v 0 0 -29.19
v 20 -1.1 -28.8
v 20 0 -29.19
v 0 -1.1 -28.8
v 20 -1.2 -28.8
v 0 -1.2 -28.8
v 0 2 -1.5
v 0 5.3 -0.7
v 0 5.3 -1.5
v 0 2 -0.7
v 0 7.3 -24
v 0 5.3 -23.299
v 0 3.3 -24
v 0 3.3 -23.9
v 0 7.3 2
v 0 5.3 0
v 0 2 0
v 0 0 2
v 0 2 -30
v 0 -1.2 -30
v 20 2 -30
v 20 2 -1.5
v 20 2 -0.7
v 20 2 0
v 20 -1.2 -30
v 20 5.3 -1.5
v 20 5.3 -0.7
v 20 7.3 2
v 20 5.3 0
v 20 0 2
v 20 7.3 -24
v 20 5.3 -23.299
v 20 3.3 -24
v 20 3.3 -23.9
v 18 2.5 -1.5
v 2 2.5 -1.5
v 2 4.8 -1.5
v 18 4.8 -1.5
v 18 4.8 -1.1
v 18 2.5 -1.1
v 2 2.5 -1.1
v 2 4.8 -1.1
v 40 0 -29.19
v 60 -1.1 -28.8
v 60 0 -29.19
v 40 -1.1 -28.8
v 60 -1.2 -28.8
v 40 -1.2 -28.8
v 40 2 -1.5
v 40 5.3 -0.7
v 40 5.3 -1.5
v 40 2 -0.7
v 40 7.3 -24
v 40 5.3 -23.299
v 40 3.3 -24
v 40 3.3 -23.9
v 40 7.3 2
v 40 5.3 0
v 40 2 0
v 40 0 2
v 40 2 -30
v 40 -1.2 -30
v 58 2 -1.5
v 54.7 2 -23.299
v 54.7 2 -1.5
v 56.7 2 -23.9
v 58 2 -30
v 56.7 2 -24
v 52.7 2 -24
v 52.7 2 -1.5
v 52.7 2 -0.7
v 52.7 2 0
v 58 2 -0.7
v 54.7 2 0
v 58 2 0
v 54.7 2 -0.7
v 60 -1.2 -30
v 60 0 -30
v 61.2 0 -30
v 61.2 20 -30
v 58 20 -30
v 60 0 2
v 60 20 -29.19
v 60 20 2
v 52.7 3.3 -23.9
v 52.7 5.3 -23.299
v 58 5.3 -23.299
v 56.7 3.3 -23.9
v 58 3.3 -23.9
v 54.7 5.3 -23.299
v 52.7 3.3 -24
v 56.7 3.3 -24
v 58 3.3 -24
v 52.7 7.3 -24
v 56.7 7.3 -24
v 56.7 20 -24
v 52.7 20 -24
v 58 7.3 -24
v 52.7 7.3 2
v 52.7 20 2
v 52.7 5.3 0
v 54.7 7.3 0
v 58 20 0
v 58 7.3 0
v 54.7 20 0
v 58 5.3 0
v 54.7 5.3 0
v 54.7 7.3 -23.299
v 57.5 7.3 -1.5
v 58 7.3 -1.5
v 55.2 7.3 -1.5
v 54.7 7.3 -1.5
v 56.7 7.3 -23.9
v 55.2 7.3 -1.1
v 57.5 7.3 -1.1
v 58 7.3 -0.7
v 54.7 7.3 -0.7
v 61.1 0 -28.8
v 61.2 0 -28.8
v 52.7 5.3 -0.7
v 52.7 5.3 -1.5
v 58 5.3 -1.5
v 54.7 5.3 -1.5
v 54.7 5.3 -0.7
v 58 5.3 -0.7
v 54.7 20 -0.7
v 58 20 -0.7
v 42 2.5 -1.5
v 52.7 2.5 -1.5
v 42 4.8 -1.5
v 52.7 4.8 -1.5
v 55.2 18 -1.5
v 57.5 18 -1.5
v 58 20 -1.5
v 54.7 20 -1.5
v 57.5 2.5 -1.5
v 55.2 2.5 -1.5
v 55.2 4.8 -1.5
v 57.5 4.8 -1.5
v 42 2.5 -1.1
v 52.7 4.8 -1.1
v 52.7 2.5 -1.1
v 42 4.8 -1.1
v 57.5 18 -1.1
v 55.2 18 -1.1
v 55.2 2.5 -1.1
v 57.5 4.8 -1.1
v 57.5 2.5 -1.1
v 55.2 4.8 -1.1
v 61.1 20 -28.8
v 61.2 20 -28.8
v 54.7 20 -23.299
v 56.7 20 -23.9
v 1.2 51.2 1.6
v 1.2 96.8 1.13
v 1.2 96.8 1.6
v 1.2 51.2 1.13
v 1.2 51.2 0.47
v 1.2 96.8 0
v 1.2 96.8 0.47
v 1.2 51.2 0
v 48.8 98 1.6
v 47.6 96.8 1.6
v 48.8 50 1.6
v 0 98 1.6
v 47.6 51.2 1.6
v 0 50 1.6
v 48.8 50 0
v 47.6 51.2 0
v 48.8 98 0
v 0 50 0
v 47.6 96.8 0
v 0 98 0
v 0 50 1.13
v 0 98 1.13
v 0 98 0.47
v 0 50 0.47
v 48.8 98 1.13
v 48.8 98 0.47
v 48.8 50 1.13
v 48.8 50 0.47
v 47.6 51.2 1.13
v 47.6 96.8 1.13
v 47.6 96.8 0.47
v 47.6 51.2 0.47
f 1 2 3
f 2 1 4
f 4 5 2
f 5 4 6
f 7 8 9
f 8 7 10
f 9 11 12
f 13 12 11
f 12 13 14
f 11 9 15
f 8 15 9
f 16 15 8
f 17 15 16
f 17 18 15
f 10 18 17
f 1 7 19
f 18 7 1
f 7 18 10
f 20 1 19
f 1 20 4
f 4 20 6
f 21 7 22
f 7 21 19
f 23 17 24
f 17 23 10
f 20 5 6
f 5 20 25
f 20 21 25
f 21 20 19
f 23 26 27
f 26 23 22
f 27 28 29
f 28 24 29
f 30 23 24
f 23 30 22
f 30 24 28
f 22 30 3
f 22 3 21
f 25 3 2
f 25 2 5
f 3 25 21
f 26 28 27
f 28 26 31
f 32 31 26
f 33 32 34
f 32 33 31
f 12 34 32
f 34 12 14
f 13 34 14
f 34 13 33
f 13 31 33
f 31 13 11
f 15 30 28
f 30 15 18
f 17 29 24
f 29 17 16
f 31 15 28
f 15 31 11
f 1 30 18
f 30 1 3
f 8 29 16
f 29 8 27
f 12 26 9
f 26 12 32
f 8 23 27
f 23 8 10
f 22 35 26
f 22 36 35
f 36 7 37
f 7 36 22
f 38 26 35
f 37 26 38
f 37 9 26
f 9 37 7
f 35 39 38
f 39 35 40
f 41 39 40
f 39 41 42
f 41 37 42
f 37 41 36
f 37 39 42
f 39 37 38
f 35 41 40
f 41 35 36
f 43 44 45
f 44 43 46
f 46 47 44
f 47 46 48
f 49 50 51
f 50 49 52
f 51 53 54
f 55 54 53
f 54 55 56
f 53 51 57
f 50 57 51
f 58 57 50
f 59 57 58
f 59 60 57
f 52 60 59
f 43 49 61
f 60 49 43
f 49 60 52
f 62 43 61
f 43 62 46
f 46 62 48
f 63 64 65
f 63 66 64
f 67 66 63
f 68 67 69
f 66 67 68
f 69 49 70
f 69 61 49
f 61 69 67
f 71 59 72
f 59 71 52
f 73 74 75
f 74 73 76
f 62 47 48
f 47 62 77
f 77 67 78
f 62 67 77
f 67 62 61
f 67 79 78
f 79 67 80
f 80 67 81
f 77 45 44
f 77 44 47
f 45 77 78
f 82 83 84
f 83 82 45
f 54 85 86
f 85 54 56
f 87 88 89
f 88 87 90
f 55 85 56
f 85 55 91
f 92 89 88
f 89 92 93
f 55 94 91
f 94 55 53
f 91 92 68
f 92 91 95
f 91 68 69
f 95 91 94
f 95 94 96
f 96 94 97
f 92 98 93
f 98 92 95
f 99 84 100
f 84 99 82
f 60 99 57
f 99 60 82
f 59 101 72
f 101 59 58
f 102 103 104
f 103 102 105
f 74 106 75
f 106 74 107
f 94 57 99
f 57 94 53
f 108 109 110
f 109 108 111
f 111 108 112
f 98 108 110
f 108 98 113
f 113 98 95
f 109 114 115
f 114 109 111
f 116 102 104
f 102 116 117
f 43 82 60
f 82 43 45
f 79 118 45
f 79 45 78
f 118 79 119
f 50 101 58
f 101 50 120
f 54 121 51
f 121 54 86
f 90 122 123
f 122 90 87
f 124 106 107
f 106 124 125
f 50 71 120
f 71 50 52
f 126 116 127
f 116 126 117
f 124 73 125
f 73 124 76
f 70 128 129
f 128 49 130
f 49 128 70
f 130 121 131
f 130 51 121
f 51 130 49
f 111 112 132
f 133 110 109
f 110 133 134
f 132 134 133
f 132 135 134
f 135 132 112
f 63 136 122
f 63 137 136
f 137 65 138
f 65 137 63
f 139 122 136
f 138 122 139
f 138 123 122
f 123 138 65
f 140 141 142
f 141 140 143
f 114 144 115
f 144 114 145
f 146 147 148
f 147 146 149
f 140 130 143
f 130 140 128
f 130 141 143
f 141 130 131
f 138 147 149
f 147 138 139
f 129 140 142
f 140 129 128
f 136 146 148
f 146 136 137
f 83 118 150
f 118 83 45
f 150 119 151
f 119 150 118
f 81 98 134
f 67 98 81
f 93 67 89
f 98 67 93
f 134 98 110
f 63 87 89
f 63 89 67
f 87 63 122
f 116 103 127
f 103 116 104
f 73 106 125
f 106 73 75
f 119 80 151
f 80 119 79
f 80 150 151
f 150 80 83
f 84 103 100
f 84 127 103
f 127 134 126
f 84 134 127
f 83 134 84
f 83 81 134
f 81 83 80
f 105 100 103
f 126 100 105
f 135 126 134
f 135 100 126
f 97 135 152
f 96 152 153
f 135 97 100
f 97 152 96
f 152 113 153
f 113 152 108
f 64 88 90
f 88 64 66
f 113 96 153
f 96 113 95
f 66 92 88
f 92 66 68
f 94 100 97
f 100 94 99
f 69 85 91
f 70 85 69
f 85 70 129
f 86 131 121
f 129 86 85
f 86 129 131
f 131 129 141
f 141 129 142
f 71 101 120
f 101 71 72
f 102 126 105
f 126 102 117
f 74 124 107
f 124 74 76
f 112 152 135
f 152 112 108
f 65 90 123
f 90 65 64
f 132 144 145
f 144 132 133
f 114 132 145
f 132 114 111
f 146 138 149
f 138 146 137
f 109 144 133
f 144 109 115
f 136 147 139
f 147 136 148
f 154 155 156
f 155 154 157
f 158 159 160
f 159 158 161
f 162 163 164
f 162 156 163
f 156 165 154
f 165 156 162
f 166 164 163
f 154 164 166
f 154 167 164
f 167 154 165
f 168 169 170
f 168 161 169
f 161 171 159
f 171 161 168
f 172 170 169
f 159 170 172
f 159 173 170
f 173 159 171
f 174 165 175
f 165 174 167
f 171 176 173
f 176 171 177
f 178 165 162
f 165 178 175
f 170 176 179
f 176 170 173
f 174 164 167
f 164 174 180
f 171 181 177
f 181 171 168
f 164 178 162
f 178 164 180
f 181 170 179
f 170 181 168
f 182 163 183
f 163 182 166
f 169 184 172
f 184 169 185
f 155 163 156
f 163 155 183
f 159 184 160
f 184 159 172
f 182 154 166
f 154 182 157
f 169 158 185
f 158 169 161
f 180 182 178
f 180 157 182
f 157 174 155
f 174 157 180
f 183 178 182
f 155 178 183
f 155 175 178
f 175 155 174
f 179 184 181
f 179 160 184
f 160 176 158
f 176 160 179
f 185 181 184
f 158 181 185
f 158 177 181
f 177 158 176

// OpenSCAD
// ==========================================
// SNAP-FIT CLIP PARA TAMPA E BASE - CAIXA DE FILTRAGEM
// Impressão 3D - PLA/PETG (Ender 3)
// ==========================================
// 16 clips: 8 tampa (topo) + 8 base (inferior)
// Encaixam na tampa/base (3mm) e travam na borda lateral/frontal/traseira
// Vedação com lábio flexível
// Pé dobrado: altura 30mm (ext) / 24mm (int)
// Requer slots 22×2mm cortados no MDF a 30mm da borda
// ==========================================

// Parâmetros da caixa
mdf = 3;          // Espessura MDF
folga = 0.3;      // Folga para encaixe
parede = 2;       // Espessura da parede do clip

// Parâmetros do clip
largura_clip = 20;   // Largura do clip ao longo da borda
altura_ext = 30;     // Altura externa (pé dobrado, desce pelo lado externo)
altura_int = 24;     // Altura interna (pé dobrado, desce por dentro da caixa)
gancho = 1.2;        // Profundidade do gancho snap-fit
angulo_gancho = 45;  // Ângulo da rampa de entrada

// Slot no MDF para o gancho
slot_largura = 22;   // 20mm clip + 2mm folga
slot_altura = 2;     // 1.2mm gancho + folga
slot_pos_borda = 30; // Distância do gancho até a borda (= altura_ext)

// Lábio de vedação
labio_h = 1.5;    // Altura do lábio
labio_esp = 0.8;  // Espessura do lábio (flexível)

module snap_clip_tampa() {
    // Parte que abraça a borda (U invertido)
    difference() {
        union() {
            // Parte superior (sobre a tampa)
            translate([0, 0, 0])
                cube([largura_clip, mdf + folga + 2*parede, parede]);
            
            // Parede externa (desce por fora da caixa)
            translate([0, 0, -altura_ext])
                cube([largura_clip, parede, altura_ext + parede]);
            
            // Parede interna (desce por dentro da caixa)
            translate([0, mdf + folga + parede, -altura_int])
                cube([largura_clip, parede, altura_int + parede]);
            
            // Gancho externo (snap-fit)
            translate([0, 0, -altura_ext])
                gancho_snap(largura_clip, parede, gancho, angulo_gancho);
            
            // Gancho interno (snap-fit)
            translate([0, mdf + folga + parede, -altura_int])
                mirror([0, 1, 0])
                    gancho_snap(largura_clip, parede, gancho * 0.8, angulo_gancho);
            
            // Lábio de vedação (interno, flexível)
            translate([0, parede, -labio_h])
                cube([largura_clip, mdf + folga, labio_esp]);
        }
        
        // Canal para facilitar flexão do lábio
        translate([largura_clip/2, parede + (mdf+folga)/2, -labio_h - 0.1])
            cube([largura_clip - 4, mdf + folga - 1, labio_esp + 0.2], center=true);
    }
}

module gancho_snap(w, wall_t, hook_d, angle) {
    // Rampa de entrada + gancho de retenção
    hull() {
        cube([w, wall_t, 0.1]);
        translate([0, -hook_d, 0])
            cube([w, 0.1, hook_d / tan(angle)]);
    }
    // Gancho de retenção (face plana para travar)
    translate([0, -hook_d, 0])
        cube([w, hook_d, 0.6]);
}

// === CLIP PARA CANTOS (L-shaped) ===
// Para os 4 cantos da caixa onde lateral encontra frontal/traseira
module snap_clip_canto() {
    snap_clip_tampa();
    
    // Extensão em L para o canto
    translate([largura_clip, 0, 0])
    rotate([0, 0, 90])
        snap_clip_tampa();
}

// === VEDAÇÃO PARA DIVISÓRIAS ===
// Frame que envolve a borda da divisória e veda contra as laterais
module vedacao_divisoria() {
    // Parâmetros da divisória (244×240mm entre bases dos trilhos)
    div_w = 244;   // largura X
    div_h = 240;   // altura Y (entre bases dos trilhos)
    
    frame_w = 6;   // Largura do frame
    frame_h = 8;   // Altura (envolve a borda do MDF)
    canal = mdf + folga;  // Canal para o MDF
    
    difference() {
        // Frame externo
        union() {
            // Lado esquerdo
            translate([0, 0, 0])
                cube([frame_w, div_h, frame_h]);
            // Lado direito
            translate([div_w - frame_w, 0, 0])
                cube([frame_w, div_h, frame_h]);
            // Topo
            translate([0, div_h - frame_w, 0])
                cube([div_w, frame_w, frame_h]);
            // Base (com abertura central para fluxo)
            translate([0, 0, 0])
                cube([div_w, frame_w, frame_h]);
        }
        
        // Canal para o MDF (centro do frame)
        translate([-0.1, -0.1, (frame_h - canal)/2])
            cube([div_w + 0.2, div_h + 0.2, canal]);
        
        // Abertura central (o furo da divisória)
        translate([frame_w + 5, frame_w + 5, -0.1])
            cube([div_w - 2*frame_w - 10, div_h - 2*frame_w - 10, frame_h + 0.2]);
    }
    
    // Lábios de vedação nas faces internas
    for (face = [0, 1]) {
        z_pos = face * (frame_h - labio_esp);
        // Esquerda
        translate([frame_w - labio_esp, frame_w, z_pos])
            cube([labio_esp, div_h - 2*frame_w, labio_esp]);
        // Direita
        translate([div_w - frame_w, frame_w, z_pos])
            cube([labio_esp, div_h - 2*frame_w, labio_esp]);
        // Topo
        translate([frame_w, div_h - frame_w, z_pos])
            cube([div_w - 2*frame_w, labio_esp, labio_esp]);
        // Base
        translate([frame_w, frame_w - labio_esp, z_pos])
            cube([div_w - 2*frame_w, labio_esp, labio_esp]);
    }
}

// === RENDER ===
// Clip individual (tampa/base - mesmo clip para ambos)
snap_clip_tampa();

// Visualização: clip de canto (deslocado)
translate([40, 0, 0])
    snap_clip_canto();

// Visualização: frame vedação divisória (deslocado, escala reduzida)
translate([0, 50, 0])
    scale(0.2)
        vedacao_divisoria();

// Texto informativo (não renderiza, só comentário)
// Impressão recomendada:
// - Material: PETG (melhor flexibilidade) ou PLA
// - Layer: 0.2mm
// - Infill: 80-100%
// - Walls: 3 perímetros mínimo
// - Orientação: clip deitado, ponte para cima
// - Qtd: 16 unidades (8 topo + 8 base)
